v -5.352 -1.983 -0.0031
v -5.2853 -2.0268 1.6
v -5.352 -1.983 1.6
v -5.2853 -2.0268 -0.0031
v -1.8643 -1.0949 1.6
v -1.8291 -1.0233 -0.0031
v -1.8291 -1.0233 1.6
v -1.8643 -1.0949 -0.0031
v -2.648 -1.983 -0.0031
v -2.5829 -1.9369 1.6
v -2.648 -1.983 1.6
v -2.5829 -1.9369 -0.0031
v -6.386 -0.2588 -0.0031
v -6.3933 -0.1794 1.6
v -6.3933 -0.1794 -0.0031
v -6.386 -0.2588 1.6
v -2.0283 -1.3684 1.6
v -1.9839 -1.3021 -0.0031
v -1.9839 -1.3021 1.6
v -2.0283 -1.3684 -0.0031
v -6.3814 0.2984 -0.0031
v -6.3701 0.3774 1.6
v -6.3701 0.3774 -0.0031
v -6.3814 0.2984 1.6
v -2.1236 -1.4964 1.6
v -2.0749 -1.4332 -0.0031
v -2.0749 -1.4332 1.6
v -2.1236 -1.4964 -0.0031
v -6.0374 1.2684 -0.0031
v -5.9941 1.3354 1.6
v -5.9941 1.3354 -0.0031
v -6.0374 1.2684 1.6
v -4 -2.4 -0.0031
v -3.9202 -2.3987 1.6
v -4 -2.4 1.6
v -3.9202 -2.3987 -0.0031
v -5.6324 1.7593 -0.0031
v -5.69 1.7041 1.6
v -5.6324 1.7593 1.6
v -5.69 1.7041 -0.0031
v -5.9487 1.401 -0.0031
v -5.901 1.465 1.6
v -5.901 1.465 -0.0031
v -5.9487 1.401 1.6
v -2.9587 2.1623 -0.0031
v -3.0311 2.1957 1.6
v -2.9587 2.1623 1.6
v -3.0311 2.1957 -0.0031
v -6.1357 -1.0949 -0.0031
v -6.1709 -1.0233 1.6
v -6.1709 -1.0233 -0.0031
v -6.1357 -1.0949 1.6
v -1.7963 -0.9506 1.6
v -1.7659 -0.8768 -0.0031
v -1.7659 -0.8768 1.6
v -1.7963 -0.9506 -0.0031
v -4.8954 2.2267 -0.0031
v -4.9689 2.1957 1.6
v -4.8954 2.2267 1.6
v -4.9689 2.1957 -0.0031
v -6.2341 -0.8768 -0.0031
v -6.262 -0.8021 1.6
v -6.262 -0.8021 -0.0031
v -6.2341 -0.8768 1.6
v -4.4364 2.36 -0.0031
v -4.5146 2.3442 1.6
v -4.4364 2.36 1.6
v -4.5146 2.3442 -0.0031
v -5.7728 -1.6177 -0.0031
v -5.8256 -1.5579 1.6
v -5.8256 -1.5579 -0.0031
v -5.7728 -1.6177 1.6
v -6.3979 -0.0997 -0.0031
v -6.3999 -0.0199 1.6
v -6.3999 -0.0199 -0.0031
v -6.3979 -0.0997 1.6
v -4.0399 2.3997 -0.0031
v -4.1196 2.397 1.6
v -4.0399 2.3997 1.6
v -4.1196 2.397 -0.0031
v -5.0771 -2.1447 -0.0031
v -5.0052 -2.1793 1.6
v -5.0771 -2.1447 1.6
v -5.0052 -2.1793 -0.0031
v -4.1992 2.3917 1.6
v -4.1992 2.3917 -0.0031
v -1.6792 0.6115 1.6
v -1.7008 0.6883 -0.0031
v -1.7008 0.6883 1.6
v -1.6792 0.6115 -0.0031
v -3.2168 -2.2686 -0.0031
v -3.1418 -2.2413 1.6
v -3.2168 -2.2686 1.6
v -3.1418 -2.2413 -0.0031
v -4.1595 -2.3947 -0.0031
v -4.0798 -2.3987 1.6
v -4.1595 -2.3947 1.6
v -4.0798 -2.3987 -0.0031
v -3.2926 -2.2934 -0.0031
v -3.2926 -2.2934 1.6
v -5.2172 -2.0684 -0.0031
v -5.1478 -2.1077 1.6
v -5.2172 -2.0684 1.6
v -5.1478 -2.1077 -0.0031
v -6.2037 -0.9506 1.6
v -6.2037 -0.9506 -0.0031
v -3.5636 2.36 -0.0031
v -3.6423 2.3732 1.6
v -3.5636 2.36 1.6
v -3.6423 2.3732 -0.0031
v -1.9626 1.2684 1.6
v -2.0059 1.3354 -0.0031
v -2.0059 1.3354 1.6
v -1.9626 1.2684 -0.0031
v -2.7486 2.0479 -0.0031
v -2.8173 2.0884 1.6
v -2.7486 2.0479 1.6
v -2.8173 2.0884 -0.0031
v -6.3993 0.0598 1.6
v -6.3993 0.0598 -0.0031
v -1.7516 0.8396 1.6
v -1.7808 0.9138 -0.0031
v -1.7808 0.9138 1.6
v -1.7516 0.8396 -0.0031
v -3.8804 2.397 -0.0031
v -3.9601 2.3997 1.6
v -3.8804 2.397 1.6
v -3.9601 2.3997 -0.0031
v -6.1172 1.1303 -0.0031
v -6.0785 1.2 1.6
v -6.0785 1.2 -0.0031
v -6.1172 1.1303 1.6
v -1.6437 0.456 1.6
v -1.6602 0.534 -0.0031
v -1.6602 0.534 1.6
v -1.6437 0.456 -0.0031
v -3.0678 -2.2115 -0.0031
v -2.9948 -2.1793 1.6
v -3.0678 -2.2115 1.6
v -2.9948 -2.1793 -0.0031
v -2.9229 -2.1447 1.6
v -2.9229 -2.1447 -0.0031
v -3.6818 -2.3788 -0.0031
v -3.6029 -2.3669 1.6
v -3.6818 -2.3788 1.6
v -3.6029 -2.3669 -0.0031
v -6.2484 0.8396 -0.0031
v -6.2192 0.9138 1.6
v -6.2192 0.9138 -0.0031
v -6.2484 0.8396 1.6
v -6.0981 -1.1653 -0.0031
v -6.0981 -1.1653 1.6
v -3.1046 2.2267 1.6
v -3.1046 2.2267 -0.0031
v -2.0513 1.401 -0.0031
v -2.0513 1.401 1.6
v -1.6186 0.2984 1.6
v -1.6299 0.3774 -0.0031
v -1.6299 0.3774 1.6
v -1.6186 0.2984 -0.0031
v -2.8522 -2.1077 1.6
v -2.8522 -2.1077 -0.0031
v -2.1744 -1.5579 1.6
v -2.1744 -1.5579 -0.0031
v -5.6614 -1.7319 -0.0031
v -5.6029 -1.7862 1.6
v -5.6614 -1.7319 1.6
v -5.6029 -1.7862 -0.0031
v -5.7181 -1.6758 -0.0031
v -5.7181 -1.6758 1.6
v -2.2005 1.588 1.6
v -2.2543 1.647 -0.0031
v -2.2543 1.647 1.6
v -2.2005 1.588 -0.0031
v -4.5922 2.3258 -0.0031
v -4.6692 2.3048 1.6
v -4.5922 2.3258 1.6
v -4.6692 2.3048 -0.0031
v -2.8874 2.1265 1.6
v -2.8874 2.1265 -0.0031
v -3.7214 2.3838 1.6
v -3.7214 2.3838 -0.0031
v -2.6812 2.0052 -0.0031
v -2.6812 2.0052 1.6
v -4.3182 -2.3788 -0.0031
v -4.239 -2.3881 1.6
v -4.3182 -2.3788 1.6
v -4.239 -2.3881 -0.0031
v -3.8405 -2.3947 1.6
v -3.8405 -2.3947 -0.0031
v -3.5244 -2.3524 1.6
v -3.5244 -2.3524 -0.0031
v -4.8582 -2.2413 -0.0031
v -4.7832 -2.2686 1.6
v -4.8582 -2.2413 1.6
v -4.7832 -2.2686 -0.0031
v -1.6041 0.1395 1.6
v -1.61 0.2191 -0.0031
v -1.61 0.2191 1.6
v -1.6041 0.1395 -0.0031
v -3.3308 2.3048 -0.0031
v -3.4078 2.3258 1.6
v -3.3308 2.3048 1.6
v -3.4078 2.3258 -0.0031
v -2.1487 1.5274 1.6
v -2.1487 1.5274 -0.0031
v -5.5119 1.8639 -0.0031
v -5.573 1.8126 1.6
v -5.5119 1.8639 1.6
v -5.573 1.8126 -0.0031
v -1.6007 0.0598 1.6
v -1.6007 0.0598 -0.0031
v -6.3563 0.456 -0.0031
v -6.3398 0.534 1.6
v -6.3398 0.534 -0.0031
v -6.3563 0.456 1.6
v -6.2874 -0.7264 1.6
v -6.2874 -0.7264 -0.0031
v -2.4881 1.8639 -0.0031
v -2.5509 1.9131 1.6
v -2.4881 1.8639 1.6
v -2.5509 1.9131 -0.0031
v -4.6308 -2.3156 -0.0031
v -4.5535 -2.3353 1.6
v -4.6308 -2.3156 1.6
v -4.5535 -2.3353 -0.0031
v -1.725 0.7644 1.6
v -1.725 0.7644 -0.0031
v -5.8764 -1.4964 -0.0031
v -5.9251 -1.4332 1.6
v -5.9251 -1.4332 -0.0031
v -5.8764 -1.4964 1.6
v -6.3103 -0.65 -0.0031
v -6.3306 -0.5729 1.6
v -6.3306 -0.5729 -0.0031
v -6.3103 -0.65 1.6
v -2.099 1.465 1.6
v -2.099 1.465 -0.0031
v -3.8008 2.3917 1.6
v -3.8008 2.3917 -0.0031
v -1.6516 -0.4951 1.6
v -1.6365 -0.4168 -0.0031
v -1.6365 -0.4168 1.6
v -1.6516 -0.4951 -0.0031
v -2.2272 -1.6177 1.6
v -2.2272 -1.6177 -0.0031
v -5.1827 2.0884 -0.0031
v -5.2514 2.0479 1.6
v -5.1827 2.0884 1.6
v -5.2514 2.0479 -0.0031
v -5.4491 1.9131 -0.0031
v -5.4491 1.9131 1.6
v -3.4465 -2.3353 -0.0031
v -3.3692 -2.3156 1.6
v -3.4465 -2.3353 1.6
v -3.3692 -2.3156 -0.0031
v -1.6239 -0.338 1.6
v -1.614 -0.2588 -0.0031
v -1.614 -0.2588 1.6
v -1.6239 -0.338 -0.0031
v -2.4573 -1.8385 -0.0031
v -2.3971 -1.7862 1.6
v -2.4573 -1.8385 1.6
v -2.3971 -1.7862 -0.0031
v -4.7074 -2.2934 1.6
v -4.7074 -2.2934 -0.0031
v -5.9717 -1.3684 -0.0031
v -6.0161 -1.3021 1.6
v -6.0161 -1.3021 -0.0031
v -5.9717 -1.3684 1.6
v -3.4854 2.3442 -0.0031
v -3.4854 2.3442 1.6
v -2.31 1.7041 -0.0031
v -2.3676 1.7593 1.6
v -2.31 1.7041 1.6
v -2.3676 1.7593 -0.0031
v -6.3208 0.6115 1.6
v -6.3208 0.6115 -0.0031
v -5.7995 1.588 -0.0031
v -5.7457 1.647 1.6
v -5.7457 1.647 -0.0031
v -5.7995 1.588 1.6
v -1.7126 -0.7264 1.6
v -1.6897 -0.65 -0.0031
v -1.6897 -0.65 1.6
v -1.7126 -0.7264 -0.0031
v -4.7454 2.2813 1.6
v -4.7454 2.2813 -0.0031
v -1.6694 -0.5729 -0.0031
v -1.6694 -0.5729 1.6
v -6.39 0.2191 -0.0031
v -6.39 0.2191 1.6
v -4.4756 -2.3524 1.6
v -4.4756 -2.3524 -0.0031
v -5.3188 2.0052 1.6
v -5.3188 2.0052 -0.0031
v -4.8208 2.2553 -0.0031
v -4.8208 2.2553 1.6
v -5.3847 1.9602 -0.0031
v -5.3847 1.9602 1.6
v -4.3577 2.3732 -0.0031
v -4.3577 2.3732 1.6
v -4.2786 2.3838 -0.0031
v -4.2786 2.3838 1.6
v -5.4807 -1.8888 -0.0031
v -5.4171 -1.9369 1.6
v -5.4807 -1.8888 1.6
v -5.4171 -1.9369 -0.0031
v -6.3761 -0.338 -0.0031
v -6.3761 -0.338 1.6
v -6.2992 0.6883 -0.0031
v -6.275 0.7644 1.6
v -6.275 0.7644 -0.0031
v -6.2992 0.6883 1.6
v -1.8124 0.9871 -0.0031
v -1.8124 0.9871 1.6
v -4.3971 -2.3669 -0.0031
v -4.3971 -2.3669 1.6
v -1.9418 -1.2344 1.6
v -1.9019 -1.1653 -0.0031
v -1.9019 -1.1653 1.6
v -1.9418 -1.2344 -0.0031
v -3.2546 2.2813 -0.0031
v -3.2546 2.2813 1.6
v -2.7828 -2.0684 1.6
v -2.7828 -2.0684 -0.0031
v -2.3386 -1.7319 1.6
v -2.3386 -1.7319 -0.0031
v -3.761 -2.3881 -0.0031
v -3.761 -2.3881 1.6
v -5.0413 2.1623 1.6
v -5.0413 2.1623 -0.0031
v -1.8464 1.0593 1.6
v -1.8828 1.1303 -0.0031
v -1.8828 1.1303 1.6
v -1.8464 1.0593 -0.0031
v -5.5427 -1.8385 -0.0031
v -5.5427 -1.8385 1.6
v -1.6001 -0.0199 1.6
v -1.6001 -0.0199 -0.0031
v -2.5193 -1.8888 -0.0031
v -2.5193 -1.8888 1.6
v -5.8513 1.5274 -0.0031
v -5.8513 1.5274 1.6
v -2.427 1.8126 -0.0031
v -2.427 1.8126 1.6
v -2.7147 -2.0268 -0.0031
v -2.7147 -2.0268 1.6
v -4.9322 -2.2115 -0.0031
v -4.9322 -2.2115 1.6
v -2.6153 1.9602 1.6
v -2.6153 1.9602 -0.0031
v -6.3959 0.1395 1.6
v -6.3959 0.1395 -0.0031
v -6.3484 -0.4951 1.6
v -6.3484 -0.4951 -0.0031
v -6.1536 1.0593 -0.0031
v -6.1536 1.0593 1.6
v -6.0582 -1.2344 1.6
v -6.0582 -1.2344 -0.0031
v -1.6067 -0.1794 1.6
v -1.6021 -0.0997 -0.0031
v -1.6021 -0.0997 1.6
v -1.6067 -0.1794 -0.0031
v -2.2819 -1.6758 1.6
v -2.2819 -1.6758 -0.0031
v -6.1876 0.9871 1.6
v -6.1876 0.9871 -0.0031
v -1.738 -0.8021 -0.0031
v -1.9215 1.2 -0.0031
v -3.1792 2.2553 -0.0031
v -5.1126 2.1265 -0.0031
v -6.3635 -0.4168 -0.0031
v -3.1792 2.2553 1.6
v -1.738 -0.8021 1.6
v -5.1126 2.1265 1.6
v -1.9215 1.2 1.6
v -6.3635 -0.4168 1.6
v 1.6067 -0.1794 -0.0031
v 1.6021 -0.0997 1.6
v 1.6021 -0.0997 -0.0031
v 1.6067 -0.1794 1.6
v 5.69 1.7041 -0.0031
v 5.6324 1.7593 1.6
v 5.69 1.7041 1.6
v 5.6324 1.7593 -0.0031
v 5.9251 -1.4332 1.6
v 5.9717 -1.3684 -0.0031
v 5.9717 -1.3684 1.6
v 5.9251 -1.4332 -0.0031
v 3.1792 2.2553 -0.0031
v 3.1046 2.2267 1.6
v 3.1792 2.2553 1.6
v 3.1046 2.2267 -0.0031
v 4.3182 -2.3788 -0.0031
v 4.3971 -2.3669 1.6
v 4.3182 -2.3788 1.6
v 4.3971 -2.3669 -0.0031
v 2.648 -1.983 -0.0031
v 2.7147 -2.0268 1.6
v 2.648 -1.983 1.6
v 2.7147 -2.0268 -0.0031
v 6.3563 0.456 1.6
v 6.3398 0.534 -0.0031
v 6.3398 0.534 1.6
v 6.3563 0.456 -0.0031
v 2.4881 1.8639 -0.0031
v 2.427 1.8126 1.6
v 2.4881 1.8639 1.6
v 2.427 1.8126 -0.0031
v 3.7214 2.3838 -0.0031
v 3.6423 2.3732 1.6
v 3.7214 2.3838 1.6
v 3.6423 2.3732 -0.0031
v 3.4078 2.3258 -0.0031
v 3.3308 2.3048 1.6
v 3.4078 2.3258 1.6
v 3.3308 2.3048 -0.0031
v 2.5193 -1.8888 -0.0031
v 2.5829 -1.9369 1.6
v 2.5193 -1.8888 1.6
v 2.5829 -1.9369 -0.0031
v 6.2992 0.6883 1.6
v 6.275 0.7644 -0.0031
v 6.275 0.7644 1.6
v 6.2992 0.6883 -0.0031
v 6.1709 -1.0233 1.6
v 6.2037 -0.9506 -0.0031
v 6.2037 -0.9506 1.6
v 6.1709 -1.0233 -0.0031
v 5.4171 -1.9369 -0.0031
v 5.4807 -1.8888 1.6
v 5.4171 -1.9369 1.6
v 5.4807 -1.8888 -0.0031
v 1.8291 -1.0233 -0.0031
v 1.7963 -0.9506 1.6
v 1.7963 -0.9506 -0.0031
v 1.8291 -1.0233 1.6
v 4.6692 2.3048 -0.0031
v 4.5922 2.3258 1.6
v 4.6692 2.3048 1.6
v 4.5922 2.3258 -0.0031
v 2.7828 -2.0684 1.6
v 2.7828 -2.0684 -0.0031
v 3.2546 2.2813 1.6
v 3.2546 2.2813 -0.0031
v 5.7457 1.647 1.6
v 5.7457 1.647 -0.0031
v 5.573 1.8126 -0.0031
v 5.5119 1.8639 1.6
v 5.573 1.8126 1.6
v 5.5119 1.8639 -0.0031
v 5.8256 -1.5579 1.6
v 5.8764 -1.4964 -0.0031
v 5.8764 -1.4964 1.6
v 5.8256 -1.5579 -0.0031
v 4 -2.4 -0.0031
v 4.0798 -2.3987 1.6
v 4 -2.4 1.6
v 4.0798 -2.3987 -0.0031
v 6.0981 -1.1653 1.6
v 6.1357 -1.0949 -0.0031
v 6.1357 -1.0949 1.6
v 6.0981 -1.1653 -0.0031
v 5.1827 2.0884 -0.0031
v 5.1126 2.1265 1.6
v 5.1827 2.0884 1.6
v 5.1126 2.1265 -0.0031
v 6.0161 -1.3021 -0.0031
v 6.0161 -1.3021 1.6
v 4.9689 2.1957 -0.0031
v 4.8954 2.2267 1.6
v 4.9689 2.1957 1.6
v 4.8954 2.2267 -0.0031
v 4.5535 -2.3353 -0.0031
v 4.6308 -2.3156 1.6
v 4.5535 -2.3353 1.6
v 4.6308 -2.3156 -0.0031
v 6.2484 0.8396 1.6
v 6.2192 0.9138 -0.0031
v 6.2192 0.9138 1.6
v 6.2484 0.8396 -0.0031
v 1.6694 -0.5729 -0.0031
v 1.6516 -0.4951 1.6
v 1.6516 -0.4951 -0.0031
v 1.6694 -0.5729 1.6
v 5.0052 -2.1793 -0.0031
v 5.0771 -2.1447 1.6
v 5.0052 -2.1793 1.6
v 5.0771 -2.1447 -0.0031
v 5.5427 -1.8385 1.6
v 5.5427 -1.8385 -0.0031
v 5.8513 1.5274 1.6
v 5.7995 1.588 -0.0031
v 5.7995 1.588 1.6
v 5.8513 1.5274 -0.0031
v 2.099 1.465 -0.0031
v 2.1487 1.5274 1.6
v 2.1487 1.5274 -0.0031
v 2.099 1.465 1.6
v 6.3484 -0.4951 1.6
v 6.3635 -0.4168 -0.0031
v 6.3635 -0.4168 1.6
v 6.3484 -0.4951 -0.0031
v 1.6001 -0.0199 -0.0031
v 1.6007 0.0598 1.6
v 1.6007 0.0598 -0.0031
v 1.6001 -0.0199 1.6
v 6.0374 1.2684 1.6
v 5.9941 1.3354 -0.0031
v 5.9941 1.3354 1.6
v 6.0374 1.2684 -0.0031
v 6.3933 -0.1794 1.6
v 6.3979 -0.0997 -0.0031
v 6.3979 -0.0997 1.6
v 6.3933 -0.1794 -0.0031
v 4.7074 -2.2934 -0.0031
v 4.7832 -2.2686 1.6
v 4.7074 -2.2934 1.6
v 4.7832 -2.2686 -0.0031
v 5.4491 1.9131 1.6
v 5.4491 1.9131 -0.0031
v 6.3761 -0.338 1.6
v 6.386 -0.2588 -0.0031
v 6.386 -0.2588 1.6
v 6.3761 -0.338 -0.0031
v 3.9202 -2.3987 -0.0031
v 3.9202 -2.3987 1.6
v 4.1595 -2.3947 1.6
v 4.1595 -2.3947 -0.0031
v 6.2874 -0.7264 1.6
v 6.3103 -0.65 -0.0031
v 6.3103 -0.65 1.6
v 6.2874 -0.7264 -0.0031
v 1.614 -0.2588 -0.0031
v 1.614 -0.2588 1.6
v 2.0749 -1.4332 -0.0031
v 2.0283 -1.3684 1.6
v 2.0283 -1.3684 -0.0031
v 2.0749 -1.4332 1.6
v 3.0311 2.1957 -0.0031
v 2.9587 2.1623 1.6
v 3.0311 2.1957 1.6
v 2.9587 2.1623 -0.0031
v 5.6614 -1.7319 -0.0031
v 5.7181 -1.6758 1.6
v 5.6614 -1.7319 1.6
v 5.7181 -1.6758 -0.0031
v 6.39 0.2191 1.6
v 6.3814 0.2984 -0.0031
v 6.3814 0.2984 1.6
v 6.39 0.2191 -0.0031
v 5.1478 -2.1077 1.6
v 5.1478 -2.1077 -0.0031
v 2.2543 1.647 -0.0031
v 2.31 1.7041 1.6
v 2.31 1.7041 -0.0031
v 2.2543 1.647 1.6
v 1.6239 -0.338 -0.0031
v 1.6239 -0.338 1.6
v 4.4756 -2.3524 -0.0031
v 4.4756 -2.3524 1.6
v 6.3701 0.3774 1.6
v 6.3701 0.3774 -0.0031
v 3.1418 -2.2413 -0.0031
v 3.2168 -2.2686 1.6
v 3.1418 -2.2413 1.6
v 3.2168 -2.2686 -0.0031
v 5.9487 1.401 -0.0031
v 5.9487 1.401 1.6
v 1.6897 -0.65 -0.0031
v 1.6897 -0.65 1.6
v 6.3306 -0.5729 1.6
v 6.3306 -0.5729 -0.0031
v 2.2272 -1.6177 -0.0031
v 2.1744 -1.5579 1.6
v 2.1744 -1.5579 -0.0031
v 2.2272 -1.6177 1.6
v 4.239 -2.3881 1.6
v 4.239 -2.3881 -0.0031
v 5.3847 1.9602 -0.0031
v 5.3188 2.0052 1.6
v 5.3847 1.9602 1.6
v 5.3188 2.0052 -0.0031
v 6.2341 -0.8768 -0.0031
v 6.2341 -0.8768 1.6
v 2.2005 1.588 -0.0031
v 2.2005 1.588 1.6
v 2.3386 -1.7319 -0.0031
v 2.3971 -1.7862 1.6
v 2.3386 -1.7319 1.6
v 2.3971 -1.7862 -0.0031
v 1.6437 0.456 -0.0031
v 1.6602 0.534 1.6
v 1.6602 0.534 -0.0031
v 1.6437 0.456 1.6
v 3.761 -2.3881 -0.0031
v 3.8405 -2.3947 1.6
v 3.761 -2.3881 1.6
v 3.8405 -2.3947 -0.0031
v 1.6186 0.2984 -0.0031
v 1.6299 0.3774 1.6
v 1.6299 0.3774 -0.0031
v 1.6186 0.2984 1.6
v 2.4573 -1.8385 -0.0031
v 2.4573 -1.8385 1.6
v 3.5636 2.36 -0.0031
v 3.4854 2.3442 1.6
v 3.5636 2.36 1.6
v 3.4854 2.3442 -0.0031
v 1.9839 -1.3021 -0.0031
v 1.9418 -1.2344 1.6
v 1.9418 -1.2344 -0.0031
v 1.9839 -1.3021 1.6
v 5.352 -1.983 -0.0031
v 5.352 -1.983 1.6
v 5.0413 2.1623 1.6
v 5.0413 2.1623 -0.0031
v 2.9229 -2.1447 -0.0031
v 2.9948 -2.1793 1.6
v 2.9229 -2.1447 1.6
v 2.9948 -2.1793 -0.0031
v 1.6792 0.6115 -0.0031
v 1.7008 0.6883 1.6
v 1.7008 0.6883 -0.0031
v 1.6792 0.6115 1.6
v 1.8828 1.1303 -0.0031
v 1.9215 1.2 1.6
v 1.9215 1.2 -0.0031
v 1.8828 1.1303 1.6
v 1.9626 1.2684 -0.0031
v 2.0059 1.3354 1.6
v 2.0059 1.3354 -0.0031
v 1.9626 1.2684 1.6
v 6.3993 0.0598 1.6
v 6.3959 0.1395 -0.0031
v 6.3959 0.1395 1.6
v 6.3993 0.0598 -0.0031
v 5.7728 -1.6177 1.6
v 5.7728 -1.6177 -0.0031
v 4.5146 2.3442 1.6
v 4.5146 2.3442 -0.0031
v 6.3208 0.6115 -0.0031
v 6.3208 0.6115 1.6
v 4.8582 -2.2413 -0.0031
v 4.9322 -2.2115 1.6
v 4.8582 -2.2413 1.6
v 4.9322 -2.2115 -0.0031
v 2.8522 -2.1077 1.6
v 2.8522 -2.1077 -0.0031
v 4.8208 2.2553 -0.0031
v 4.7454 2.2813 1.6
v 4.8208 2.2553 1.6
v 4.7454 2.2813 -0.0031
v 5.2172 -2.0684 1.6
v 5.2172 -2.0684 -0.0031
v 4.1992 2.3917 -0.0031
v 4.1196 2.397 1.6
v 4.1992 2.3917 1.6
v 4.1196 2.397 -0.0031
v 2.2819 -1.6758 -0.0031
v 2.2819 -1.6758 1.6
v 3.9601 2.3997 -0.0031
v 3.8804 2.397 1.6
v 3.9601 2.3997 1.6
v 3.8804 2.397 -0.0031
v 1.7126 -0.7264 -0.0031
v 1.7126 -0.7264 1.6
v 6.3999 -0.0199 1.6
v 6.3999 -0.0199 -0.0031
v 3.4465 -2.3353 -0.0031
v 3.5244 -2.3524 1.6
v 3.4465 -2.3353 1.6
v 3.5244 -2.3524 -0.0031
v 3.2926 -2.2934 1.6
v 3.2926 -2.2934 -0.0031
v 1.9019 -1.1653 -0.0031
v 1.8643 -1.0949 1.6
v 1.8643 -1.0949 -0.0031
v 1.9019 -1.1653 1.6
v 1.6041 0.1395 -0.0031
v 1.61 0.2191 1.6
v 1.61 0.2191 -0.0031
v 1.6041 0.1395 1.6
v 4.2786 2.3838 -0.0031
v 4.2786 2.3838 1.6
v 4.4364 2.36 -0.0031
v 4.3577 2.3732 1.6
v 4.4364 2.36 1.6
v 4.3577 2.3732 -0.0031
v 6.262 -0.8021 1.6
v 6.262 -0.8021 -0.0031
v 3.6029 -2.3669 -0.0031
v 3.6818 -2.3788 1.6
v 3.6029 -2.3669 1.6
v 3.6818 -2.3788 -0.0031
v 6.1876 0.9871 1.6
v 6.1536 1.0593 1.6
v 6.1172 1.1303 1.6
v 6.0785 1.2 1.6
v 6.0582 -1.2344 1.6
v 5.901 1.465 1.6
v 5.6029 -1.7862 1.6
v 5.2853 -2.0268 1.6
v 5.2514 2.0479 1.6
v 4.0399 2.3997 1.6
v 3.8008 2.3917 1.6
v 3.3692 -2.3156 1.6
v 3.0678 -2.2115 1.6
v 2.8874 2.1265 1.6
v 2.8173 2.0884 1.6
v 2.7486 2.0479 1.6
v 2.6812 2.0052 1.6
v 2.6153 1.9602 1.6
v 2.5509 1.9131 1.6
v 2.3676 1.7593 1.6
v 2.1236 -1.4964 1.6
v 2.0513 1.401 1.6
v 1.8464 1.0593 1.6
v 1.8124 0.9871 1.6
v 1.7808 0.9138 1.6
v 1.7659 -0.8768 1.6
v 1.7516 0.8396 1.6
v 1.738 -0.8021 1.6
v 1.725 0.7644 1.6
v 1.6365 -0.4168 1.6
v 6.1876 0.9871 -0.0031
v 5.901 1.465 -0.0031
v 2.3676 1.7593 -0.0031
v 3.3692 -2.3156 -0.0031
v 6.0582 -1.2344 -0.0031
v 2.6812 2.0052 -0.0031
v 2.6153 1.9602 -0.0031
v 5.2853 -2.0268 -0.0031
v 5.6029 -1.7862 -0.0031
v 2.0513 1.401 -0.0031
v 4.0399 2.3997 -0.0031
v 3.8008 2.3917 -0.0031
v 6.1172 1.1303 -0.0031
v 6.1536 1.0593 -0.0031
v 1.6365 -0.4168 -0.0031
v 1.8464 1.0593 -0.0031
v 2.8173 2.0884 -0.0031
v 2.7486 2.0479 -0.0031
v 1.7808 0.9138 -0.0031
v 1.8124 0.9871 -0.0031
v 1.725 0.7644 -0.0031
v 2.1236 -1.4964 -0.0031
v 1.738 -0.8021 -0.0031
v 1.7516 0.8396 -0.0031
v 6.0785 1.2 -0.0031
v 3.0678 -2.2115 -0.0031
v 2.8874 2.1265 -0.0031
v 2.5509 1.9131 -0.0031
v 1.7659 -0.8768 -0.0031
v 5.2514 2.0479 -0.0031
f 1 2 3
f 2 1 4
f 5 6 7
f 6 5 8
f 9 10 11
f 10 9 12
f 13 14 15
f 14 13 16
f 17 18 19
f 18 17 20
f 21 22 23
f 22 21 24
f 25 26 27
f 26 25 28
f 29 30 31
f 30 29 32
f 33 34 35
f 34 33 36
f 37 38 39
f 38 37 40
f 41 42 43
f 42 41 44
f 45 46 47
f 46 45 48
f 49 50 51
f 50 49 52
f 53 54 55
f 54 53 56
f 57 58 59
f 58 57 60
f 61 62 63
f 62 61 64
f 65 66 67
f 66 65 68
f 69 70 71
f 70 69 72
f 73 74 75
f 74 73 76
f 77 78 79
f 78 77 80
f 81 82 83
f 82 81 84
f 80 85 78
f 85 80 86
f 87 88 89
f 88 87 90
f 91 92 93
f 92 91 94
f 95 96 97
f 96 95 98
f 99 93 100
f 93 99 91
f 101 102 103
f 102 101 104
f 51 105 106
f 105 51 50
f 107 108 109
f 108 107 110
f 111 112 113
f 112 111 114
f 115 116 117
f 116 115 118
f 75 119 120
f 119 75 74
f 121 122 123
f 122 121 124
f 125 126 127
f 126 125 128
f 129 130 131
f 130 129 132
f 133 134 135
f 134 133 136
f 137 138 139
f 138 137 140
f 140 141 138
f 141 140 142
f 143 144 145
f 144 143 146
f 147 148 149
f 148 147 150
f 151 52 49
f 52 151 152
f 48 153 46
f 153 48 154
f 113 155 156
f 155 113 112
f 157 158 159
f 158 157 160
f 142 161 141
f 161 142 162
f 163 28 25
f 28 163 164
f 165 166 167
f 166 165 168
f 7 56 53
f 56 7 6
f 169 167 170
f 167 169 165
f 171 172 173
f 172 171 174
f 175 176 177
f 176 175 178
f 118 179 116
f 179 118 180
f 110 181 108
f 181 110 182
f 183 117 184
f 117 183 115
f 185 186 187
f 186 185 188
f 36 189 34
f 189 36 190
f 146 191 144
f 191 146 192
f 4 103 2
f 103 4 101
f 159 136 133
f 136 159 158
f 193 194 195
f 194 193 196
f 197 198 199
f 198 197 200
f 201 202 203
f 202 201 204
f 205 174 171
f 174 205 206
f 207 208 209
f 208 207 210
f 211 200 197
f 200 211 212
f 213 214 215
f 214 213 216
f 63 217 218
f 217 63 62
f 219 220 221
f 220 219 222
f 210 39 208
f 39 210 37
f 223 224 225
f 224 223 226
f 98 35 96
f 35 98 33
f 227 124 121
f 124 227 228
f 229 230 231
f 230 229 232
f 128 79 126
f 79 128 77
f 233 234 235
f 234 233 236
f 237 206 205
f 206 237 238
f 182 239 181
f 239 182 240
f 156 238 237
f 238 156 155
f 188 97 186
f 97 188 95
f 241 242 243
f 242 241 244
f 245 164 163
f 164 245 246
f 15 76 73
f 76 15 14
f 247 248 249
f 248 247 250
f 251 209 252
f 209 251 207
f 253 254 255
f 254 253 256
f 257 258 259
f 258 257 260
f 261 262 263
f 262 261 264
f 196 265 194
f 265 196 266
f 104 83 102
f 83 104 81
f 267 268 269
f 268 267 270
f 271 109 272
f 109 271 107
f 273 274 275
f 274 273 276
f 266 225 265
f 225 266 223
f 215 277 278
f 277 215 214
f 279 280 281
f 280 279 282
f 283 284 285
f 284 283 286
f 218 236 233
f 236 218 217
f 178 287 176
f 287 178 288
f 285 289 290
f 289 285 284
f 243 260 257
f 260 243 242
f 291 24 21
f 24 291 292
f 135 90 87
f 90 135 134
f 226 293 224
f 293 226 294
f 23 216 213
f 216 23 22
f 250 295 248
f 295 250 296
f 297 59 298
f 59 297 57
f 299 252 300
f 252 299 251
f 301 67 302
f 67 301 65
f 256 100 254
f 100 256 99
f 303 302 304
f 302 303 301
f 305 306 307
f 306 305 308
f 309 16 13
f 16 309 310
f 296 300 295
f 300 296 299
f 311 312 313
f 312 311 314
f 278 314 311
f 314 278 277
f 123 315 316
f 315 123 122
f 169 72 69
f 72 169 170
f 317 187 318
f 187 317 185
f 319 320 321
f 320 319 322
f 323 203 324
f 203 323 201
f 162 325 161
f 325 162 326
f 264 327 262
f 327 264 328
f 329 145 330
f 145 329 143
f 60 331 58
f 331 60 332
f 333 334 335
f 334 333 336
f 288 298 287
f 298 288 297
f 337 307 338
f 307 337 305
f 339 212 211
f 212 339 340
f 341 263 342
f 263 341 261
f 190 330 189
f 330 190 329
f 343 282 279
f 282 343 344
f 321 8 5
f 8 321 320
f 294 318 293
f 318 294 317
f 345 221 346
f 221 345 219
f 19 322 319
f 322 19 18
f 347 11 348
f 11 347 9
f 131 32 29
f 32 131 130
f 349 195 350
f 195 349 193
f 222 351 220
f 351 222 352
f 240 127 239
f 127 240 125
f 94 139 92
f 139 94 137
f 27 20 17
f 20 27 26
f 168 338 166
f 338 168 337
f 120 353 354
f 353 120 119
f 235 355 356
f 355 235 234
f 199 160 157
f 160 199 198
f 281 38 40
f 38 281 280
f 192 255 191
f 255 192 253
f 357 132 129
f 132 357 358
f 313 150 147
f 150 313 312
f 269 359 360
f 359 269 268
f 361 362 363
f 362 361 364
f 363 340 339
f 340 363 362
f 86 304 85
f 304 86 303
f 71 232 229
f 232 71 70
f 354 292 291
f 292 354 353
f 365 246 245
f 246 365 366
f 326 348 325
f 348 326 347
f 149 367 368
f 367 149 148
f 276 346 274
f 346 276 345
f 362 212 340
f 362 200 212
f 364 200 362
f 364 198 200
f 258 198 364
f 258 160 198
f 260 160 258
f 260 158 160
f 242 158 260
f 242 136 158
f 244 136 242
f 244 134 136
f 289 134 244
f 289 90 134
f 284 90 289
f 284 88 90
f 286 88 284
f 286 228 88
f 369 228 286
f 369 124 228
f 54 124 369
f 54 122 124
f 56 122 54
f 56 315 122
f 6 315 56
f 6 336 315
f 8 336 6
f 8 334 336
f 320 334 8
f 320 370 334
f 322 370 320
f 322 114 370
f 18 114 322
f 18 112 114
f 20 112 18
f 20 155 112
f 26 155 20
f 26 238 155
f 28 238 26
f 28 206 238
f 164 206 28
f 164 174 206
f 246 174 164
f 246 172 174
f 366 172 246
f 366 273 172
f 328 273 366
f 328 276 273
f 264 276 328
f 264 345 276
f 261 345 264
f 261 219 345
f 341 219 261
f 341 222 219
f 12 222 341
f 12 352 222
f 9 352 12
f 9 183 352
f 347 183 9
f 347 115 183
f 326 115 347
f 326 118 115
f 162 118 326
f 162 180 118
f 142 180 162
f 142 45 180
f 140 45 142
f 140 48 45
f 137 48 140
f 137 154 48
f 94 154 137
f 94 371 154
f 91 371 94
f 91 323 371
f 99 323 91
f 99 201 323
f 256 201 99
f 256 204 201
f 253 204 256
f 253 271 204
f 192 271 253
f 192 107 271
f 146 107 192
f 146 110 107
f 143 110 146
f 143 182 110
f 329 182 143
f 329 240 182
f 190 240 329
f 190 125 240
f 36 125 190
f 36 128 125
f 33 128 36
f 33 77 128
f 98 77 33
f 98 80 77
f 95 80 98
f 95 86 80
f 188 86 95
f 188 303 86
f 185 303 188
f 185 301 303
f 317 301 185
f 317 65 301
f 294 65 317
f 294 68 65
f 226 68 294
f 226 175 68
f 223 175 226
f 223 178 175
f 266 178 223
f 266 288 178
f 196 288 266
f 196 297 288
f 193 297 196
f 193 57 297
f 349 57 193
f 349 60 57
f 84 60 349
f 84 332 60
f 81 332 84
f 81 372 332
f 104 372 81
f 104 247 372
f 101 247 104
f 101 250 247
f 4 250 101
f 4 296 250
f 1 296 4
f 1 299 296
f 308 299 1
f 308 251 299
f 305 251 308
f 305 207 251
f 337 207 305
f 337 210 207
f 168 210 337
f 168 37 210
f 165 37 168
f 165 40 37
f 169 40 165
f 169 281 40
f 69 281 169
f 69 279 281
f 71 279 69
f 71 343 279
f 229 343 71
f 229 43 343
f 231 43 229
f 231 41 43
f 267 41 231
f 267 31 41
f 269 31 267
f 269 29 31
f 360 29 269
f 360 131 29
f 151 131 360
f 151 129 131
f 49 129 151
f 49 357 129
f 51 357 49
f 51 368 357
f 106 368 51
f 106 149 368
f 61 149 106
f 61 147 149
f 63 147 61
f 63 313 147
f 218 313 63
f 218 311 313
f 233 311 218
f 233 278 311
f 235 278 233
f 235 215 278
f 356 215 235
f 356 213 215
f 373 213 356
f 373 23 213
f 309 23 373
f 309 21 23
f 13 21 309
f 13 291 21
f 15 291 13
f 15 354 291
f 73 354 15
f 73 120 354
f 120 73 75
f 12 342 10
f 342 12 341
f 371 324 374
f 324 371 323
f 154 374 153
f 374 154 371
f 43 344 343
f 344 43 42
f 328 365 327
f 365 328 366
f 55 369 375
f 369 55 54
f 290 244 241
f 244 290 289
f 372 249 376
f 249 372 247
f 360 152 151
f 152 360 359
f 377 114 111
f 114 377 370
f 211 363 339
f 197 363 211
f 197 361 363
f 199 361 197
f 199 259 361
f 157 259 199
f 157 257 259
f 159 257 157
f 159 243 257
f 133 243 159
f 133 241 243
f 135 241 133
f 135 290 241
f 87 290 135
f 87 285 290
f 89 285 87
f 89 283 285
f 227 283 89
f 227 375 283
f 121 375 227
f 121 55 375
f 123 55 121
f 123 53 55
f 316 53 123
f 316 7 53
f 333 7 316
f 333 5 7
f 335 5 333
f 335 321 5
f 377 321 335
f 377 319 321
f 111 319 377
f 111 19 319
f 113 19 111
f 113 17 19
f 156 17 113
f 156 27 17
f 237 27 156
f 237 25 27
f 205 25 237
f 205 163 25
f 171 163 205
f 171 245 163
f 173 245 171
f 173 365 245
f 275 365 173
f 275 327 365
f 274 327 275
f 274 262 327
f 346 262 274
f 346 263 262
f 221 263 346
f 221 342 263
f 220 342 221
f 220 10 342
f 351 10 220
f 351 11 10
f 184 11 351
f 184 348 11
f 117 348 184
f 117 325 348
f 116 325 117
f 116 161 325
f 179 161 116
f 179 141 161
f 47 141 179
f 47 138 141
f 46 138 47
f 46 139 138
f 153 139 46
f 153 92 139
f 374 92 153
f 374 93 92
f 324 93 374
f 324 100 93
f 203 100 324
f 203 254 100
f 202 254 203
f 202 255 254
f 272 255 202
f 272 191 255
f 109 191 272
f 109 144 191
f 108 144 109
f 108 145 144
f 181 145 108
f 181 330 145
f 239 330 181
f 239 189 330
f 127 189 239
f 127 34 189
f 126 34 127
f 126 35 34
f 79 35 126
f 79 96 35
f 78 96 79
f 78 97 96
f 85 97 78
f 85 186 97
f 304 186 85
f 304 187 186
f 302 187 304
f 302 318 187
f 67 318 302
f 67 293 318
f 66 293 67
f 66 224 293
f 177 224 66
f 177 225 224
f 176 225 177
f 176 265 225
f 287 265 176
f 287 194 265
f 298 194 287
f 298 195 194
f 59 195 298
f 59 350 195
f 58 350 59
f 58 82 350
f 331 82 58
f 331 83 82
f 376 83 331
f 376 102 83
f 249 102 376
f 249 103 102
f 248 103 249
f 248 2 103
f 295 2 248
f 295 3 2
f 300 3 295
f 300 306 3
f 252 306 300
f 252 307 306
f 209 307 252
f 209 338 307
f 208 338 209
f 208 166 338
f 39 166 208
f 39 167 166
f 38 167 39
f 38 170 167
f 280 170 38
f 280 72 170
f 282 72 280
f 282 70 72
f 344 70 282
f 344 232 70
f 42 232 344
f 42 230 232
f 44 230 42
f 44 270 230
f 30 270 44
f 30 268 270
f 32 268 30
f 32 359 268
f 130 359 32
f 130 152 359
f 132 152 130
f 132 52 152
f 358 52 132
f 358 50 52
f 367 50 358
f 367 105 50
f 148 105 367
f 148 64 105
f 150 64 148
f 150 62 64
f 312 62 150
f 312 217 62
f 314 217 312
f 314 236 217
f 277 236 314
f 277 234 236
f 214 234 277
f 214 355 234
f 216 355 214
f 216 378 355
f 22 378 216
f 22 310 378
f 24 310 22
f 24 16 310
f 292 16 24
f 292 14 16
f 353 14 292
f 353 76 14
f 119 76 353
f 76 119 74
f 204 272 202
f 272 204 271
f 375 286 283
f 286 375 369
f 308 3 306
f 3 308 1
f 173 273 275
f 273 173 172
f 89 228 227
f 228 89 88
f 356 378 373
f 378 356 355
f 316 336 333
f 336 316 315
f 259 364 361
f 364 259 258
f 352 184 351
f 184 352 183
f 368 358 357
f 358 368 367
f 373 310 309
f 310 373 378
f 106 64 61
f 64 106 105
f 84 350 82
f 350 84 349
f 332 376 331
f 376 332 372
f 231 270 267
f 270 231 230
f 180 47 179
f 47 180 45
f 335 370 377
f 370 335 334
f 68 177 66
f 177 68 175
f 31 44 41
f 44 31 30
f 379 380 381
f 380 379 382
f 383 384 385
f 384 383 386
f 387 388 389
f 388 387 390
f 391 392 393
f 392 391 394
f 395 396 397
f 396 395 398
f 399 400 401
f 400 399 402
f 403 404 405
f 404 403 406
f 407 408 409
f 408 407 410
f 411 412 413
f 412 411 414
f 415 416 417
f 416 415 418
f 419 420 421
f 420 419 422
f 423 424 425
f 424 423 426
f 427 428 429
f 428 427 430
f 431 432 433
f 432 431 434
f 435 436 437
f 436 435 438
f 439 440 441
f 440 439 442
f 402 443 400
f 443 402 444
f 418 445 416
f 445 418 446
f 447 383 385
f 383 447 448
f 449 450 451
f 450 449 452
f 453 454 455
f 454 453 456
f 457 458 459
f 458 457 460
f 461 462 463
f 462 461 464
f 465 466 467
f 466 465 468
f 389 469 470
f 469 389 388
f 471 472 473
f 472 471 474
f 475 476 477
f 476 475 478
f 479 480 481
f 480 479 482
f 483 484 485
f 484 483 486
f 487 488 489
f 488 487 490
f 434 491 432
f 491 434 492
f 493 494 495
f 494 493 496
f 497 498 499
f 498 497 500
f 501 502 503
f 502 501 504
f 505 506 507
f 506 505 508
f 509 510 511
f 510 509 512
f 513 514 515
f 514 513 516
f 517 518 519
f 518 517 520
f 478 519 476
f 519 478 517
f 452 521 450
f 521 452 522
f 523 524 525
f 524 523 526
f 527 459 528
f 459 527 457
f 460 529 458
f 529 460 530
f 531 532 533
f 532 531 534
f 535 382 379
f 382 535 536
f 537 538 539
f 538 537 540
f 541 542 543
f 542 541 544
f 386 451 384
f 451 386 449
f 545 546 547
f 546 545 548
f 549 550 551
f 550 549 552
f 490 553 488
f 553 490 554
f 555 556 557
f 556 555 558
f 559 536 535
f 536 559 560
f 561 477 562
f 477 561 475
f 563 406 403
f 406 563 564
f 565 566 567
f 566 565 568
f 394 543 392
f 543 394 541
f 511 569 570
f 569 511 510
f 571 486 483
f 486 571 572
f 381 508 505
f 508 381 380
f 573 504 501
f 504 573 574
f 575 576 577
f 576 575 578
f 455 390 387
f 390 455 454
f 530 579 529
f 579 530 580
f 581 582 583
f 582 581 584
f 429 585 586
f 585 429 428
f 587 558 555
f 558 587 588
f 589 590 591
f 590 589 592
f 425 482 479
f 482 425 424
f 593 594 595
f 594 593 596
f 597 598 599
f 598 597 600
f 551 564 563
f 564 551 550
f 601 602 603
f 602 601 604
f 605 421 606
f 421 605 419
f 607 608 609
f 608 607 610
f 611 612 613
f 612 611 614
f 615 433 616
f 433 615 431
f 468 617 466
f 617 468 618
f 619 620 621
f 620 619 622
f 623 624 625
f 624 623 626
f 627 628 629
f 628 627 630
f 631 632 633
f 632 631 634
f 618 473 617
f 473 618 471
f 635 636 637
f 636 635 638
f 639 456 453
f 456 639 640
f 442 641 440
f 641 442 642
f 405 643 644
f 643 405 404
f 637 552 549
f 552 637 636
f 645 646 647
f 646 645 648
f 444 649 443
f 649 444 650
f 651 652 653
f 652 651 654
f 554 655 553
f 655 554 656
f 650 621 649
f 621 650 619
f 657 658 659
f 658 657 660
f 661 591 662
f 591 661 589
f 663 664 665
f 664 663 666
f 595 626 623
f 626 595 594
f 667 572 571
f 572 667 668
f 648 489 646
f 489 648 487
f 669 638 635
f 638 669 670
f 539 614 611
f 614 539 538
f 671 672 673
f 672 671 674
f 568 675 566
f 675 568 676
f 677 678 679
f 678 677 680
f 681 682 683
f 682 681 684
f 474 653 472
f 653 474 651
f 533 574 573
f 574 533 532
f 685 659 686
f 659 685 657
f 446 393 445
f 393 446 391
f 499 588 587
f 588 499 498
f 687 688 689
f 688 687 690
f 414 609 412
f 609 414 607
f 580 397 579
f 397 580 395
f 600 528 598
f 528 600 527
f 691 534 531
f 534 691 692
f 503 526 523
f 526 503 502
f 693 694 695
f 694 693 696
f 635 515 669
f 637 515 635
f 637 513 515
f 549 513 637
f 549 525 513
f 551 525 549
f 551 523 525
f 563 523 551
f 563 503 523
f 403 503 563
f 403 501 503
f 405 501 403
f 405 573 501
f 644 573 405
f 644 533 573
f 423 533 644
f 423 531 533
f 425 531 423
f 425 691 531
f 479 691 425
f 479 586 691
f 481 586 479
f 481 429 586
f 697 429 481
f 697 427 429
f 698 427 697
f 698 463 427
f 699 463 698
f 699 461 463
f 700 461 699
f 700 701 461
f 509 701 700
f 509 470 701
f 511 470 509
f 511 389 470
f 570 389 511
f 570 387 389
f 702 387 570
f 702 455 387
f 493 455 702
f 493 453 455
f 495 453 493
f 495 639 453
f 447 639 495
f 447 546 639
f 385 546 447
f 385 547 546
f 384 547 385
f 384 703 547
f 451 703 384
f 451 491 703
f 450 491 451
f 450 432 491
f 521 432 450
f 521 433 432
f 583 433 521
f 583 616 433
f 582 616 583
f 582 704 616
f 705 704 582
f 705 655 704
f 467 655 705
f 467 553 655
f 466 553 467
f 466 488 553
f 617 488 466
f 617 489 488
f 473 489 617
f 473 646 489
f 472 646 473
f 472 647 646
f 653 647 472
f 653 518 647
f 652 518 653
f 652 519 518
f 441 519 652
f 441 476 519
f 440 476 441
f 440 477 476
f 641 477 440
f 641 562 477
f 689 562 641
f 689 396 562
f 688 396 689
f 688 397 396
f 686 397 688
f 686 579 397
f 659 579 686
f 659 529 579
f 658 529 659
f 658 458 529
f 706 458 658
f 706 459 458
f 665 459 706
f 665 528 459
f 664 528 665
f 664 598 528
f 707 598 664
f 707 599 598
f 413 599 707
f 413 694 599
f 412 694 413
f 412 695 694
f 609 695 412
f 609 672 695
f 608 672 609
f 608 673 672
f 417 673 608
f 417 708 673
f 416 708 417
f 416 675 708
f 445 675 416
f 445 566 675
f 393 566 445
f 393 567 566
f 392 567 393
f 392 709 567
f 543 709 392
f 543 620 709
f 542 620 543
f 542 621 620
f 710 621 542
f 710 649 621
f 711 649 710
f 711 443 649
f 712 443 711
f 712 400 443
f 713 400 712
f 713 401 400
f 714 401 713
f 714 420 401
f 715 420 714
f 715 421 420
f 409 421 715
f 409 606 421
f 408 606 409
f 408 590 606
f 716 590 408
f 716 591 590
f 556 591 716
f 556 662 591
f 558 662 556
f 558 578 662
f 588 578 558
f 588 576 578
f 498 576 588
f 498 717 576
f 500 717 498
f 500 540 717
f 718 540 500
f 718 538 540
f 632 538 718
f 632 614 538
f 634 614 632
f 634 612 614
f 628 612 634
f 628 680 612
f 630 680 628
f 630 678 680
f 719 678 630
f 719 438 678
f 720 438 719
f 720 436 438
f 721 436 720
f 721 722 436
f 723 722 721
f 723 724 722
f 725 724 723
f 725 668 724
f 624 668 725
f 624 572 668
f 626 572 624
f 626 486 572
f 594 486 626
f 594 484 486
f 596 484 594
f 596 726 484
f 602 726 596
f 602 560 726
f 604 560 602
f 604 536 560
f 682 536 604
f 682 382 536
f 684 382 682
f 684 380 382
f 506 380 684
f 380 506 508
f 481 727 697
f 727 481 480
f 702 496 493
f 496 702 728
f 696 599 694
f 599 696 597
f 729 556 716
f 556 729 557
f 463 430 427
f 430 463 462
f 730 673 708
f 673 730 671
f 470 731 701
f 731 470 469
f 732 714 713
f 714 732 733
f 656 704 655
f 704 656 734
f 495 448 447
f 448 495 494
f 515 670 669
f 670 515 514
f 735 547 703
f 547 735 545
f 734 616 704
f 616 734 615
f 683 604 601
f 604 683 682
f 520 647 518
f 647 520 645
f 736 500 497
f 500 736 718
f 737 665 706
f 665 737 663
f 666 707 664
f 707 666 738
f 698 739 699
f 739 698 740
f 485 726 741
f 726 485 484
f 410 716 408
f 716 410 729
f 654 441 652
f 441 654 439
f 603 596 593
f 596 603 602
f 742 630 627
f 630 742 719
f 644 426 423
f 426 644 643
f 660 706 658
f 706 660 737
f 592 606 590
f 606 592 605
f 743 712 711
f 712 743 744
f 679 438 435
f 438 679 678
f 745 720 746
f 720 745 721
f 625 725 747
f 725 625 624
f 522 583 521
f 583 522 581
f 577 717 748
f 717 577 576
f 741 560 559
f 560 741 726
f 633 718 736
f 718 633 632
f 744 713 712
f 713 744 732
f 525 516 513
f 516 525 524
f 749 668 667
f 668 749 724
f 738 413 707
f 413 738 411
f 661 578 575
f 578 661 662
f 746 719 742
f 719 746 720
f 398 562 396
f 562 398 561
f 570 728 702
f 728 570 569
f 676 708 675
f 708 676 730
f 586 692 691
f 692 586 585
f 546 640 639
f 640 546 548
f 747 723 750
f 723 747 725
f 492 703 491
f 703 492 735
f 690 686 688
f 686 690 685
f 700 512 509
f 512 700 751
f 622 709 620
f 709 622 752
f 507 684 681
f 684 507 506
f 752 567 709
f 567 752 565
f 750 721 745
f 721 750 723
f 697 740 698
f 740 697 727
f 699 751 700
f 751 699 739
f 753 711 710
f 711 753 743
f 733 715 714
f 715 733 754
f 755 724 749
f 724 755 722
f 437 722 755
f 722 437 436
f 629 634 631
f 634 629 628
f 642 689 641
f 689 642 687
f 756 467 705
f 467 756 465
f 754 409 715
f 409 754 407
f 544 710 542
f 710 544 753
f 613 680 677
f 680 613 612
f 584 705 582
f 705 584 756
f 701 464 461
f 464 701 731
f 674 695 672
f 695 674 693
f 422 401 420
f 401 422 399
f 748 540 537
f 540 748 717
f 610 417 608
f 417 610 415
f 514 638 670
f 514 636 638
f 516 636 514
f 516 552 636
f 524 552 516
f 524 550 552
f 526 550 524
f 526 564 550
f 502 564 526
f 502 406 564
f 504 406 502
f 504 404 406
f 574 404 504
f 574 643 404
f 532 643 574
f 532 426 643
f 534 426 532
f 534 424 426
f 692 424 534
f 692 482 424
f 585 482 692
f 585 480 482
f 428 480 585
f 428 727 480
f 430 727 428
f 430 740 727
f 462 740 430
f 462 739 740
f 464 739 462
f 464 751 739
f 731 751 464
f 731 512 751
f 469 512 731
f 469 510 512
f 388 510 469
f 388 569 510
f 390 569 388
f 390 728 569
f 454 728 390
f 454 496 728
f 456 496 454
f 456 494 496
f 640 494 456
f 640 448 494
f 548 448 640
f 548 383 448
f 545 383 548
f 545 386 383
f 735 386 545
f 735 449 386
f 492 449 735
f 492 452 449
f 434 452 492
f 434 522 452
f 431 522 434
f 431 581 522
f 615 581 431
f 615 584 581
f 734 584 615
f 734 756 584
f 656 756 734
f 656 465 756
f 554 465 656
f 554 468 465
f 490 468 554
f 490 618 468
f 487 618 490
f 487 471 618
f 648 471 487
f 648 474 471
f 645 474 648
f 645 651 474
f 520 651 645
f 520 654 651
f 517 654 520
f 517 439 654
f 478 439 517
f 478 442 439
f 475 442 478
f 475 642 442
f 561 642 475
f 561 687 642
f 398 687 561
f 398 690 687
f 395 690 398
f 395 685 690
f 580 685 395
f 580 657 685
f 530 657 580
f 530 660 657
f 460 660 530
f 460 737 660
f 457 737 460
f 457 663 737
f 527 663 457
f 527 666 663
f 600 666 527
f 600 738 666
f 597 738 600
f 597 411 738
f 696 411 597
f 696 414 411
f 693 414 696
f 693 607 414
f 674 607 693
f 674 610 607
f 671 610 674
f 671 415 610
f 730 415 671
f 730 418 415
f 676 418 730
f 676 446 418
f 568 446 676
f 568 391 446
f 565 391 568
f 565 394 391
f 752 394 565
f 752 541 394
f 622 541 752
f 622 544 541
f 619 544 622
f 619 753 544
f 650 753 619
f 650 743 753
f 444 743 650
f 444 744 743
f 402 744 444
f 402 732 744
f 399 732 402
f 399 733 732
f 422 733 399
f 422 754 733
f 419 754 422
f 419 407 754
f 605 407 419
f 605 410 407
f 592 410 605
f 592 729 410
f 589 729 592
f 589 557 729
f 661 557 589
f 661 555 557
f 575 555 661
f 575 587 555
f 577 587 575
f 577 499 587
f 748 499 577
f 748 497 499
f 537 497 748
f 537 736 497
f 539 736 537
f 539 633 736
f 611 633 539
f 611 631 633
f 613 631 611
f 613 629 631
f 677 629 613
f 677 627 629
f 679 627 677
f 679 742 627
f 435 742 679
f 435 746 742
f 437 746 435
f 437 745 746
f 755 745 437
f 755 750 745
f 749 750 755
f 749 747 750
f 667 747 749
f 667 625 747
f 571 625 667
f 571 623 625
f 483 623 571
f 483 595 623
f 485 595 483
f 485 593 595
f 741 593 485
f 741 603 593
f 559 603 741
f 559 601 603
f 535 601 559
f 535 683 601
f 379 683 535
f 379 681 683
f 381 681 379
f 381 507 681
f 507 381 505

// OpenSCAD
use <../lib.scad>
use <s/3245bs01.scad>
use <s/4209s01.scad>
$fa=1; $fs=0.2;
function ldraw_lib__3245bp04(realsolid=false) = [
// 0 Brick  1 x  2 x  2 with Inside Axle Holder with Fire Logo Pattern
// 0 Name: 3245bp04.dat
// 0 Author: Takeshi Takahashi [RainbowDolphin]
// 0 !LDRAW_ORG Part UPDATE 2020-03
// 0 !LICENSE Licensed under CC BY 2.0 and CC BY 4.0 : see CAreadme.txt
// 
// 0 BFC CERTIFY CCW
  [0,"BFC","CERTIFY"],
  [0,"BFC","CCW"],
// 
// 0 !KEYWORDS bricklink 3245bpx8, Set 1065, Set 735, Set 9353
// 
// 0 !HISTORY 2020-12-29 [PTadmin] Official Update 2020-03
// 
// 
// 1 16 0 0 0 1 0 0 0 1 0 0 0 1 s\3245bs01.dat
  [1,16,0,0,0,1,0,0,0,1,0,0,0,1, ldraw_lib__s__3245bs01(realsolid)],
// 0 // Front face
// 1 16 0 22 -10 .14 0 0 0 0 -.14 0 .14 0 s\4209s01.dat
  [1,16,0,22,-10,.14,0,0,0,0,-.14,0,.14,0, ldraw_lib__s__4209s01(realsolid)],
// 4 16 -20 0 -10 -17.22 4.78 -10 17.22 4.78 -10 20 0 -10
  [4,16,-20,0,-10,-17.22,4.78,-10,17.22,4.78,-10,20,0,-10],
// 4 16 -20 0 -10 -20 48 -10 -17.22 39.22 -10 -17.22 4.78 -10
  [4,16,-20,0,-10,-20,48,-10,-17.22,39.22,-10,-17.22,4.78,-10],
// 4 16 -20 48 -10 20 48 -10 17.22 39.22 -10 -17.22 39.22 -10
  [4,16,-20,48,-10,20,48,-10,17.22,39.22,-10,-17.22,39.22,-10],
// 4 16 20 48 -10 20 0 -10 17.22 4.78 -10 17.22 39.22 -10
  [4,16,20,48,-10,20,0,-10,17.22,4.78,-10,17.22,39.22,-10],
];
module ldraw_lib__3245bp04(step=0, col=false, unit=2/5, alt=false, line=0.2, solid=!$preview)
    makepoly(ldraw_lib__3245bp04(solid), step=step, col=col, unit=unit, alt=alt, line=line, solid=solid);
ldraw_lib__3245bp04(line=0.2);
